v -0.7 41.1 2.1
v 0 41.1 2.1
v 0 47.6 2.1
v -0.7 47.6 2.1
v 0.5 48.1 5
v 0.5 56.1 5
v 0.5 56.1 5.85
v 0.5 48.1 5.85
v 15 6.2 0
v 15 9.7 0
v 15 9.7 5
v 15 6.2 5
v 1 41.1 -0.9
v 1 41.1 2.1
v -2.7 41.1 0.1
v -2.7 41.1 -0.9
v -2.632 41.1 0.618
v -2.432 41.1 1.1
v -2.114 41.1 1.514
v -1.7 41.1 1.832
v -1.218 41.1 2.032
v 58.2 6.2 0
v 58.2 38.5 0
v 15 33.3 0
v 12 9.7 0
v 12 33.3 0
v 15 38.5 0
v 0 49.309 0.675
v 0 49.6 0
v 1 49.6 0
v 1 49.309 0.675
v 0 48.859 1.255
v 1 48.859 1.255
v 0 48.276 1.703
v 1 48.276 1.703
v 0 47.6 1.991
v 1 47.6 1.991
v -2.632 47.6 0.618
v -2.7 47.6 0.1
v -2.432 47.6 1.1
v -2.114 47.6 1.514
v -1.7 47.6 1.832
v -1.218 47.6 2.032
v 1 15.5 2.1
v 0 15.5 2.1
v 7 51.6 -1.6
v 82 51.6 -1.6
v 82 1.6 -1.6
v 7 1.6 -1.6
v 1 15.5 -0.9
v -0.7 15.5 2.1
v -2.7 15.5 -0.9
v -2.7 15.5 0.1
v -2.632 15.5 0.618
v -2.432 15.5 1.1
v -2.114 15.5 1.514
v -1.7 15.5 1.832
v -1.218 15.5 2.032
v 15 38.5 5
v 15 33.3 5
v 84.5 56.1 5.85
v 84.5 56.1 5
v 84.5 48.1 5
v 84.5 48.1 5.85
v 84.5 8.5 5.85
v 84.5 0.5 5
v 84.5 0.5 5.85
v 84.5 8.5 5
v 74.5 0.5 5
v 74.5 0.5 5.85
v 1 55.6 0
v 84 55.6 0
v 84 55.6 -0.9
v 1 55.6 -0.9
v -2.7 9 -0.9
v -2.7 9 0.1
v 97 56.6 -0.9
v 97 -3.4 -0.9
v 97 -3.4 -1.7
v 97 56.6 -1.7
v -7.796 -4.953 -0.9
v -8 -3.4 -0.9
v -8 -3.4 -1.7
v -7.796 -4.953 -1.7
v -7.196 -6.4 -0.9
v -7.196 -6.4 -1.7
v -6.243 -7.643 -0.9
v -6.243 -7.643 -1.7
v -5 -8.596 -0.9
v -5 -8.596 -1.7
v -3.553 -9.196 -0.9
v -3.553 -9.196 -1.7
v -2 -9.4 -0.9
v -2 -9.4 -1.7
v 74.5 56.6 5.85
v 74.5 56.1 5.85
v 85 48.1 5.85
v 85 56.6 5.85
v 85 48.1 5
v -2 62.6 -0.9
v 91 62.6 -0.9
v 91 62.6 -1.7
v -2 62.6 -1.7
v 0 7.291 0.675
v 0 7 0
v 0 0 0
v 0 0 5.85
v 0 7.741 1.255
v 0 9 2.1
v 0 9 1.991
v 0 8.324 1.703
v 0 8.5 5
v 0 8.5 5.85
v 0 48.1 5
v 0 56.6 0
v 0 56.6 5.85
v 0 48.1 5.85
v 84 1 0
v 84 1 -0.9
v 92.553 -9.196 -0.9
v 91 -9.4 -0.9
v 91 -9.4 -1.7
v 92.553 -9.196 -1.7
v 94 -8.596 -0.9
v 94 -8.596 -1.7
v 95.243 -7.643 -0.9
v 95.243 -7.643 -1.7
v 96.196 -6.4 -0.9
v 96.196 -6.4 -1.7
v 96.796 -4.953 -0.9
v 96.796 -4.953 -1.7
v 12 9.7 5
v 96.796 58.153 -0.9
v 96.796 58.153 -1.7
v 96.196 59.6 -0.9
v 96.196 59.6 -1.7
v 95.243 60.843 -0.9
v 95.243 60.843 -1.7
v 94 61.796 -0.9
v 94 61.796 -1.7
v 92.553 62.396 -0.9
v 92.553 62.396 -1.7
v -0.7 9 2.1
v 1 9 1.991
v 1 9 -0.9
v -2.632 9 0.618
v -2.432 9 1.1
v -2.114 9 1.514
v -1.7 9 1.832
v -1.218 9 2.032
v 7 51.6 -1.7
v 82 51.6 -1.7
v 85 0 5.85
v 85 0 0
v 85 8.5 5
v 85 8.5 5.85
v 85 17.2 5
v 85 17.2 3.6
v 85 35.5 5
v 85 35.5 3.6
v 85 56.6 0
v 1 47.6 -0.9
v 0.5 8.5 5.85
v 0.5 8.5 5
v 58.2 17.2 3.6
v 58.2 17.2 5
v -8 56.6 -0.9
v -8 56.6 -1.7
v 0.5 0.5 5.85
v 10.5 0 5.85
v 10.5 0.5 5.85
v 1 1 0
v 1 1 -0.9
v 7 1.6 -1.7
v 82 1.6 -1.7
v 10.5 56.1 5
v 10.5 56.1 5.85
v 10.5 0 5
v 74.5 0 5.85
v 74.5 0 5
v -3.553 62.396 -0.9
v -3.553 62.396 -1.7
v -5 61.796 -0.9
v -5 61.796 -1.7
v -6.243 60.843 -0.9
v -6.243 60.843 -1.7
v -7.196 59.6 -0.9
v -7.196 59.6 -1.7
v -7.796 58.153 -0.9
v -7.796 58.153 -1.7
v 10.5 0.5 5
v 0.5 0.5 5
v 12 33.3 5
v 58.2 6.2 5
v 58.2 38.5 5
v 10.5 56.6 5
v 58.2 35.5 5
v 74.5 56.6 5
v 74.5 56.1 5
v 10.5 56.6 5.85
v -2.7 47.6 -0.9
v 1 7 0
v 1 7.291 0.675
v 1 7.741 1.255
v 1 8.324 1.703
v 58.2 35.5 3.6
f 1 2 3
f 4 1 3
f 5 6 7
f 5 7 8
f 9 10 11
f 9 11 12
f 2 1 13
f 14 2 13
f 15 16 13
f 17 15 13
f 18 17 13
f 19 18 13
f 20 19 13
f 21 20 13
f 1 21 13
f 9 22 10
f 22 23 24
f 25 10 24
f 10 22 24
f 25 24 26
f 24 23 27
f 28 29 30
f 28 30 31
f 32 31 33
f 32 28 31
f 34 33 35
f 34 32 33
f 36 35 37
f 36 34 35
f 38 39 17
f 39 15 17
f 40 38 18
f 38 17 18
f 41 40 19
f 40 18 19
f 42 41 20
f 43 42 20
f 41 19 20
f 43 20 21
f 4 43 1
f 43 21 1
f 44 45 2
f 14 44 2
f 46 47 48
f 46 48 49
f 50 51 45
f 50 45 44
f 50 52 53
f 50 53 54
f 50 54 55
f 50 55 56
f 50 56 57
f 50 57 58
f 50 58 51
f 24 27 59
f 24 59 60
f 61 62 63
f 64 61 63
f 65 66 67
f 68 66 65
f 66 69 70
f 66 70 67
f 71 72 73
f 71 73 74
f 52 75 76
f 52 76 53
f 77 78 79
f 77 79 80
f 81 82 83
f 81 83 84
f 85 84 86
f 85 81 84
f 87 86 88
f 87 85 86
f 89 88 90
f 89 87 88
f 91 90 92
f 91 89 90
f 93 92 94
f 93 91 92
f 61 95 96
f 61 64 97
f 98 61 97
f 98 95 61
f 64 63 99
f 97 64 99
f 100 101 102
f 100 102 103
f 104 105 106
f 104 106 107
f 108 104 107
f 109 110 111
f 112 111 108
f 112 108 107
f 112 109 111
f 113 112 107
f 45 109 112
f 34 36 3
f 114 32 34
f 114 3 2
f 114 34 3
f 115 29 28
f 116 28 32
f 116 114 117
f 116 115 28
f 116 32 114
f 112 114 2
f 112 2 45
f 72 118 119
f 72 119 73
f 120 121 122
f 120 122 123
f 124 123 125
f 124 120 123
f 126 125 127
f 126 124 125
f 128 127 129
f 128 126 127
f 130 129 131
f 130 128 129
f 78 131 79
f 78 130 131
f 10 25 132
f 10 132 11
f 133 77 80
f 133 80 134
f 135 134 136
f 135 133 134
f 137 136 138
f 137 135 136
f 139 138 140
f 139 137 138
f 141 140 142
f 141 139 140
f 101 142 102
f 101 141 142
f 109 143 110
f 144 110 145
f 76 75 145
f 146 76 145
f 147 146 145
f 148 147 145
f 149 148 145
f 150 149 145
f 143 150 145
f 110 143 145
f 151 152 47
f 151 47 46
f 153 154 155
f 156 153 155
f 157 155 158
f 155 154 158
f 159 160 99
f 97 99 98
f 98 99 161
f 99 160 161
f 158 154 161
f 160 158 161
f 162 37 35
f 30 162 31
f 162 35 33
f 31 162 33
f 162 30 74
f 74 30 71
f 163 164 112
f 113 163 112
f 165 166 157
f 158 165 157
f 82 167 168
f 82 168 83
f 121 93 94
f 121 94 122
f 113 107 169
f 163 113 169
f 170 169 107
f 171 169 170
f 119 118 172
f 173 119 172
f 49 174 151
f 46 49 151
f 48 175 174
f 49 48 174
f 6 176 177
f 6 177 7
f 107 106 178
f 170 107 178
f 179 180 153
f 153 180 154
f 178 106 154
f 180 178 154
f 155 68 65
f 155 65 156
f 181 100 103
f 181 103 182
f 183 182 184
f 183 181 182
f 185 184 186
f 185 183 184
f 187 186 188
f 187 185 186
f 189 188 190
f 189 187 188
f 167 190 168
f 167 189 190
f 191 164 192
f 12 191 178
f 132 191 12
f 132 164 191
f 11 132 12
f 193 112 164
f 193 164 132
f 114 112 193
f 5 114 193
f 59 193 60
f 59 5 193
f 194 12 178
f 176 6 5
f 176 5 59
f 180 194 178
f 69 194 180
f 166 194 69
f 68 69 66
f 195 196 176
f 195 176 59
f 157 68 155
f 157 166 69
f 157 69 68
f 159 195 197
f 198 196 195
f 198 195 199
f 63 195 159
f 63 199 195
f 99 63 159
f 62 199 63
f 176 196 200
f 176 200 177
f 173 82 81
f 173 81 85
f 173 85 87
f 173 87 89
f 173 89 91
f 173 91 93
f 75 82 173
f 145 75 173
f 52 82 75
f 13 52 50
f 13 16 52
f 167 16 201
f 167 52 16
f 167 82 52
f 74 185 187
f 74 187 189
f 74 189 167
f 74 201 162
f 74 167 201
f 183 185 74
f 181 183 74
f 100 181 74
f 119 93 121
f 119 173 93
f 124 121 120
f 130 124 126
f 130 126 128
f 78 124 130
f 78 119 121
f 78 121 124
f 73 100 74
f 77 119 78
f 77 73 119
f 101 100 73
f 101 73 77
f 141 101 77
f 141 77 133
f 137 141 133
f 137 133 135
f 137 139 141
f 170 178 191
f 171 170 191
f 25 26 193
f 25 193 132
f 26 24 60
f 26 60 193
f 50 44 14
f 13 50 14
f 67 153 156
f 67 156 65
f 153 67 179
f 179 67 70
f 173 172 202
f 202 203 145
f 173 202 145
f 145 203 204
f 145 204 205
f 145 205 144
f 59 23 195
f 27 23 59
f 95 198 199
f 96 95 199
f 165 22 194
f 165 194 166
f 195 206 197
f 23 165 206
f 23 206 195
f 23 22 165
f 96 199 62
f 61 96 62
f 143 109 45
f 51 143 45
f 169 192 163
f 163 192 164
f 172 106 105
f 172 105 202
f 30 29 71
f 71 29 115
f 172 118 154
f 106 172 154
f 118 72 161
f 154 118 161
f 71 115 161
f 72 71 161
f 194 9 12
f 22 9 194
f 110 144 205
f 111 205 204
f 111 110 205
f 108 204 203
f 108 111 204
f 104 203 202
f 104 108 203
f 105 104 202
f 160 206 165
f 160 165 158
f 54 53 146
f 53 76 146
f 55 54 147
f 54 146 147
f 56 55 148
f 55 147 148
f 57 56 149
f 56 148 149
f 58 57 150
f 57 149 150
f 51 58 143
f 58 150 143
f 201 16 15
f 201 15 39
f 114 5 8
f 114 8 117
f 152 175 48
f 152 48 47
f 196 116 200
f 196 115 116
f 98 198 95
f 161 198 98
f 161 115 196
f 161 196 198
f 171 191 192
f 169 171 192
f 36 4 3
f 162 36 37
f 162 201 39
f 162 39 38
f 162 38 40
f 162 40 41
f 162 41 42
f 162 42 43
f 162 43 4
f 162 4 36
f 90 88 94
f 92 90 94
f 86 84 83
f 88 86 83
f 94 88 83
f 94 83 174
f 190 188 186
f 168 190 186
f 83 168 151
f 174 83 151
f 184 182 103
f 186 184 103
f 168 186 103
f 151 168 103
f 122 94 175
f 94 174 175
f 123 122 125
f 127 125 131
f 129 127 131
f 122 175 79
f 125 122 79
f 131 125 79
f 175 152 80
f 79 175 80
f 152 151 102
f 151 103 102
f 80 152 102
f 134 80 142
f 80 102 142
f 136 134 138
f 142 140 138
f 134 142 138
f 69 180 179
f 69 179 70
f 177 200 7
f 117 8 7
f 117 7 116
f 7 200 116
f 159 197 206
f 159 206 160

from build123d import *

# Parameters (mm, degrees)
CROQUIS1_W              = 85
CROQUIS1_H              = 56.6
SALIENTE_EXTRUIR1_DEPTH = 5
SALIENTE_EXTRUIR2_DEPTH = 0.85
CROQUIS3_W              = 83
CROQUIS3_H              = 54.6
SALIENTE_EXTRUIR3_DEPTH = 0.9
SALIENTE_EXTRUIR4_DEPTH = 0.8
CROQUIS5_W              = 75
CROQUIS5_H              = 50
CORTAR_EXTRUIR1_DEPTH   = 0.1
CROQUIS6_W              = 26.8
CROQUIS6_H              = 18.3
CORTAR_EXTRUIR2_DEPTH   = 1.4
CROQUIS7_W              = 2.1
CROQUIS7_H              = 42.6
CORTAR_EXTRUIR3_DEPTH   = 1
REDONDEO1_R             = 2.9
SALIENTE_EXTRUIR5_REACH = 117.643
CROQUIS8_W              = 3.7
CROQUIS8_H              = 6.5
REDONDEO2_R             = 2


with BuildPart() as part:
    # Croquis1 → Saliente-Extruir1 (new body)
    with BuildSketch(Plane.XY):
        with Locations((42.5, 28.3)):
            Rectangle(CROQUIS1_W, CROQUIS1_H)
        Polygon((12, 33.3), (12, 9.7), (15, 9.7), (15, 6.2), (58.2, 6.2), (58.2, 38.5), (15, 38.5), (15, 33.3), align=None, mode=Mode.SUBTRACT)
    extrude(amount=SALIENTE_EXTRUIR1_DEPTH)

    # Croquis2 → Saliente-Extruir2 (add)
    with BuildSketch(Plane.XY.offset(5)):
        Polygon((0, 56.6), (10.5, 56.6), (10.5, 56.1), (0.5, 56.1), (0.5, 48.1), (0, 48.1), align=None)
        Polygon((85, 48.1), (85, 56.6), (74.5, 56.6), (74.5, 56.1), (84.5, 56.1), (84.5, 48.1), align=None)
        Polygon((85, 0), (74.5, 0), (74.5, 0.5), (84.5, 0.5), (84.5, 8.5), (85, 8.5), align=None)
        Polygon((0, 8.5), (0, 0), (10.5, 0), (10.5, 0.5), (0.5, 0.5), (0.5, 8.5), align=None)
    extrude(amount=SALIENTE_EXTRUIR2_DEPTH)

    # Croquis3 → Saliente-Extruir3 (add)
    with BuildSketch(Plane(origin=(0, 0, 0), x_dir=(-1, 0, 0), z_dir=(0, 0, -1))):
        with Locations((-42.5, 28.3)):
            Rectangle(CROQUIS3_W, CROQUIS3_H)
    extrude(amount=SALIENTE_EXTRUIR3_DEPTH)

    # Croquis4 → Saliente-Extruir4 (add)
    with BuildSketch(Plane(origin=(0, 0, -0.9), x_dir=(-1, 0, 0), z_dir=(0, 0, -1))):
        with BuildLine():
            Line((-91, 62.6), (2, 62.6))
            ThreePointArc((2, 62.6), (6.242640687, 60.842640687), (8, 56.6))
            Line((8, 56.6), (8, -3.4))
            ThreePointArc((8, -3.4), (6.242640687, -7.642640687), (2, -9.4))
            Line((2, -9.4), (-91, -9.4))
            ThreePointArc((-91, -9.4), (-95.242640687, -7.642640687), (-97, -3.4))
            Line((-97, -3.4), (-97, 56.6))
            ThreePointArc((-97, 56.6), (-95.242640687, 60.842640687), (-91, 62.6))
        make_face()
    extrude(amount=SALIENTE_EXTRUIR4_DEPTH)

    # Croquis5 → Cortar-Extruir1 (cut)
    with BuildSketch(Plane(origin=(0, 0, -1.7), x_dir=(-1, 0, 0), z_dir=(0, 0, -1))):
        with Locations((-44.5, 26.6)):
            Rectangle(CROQUIS5_W, CROQUIS5_H)
    extrude(amount=-CORTAR_EXTRUIR1_DEPTH, mode=Mode.SUBTRACT)

    # Croquis6 → Cortar-Extruir2 (cut)
    with BuildSketch(Plane.XY.offset(5)):
        with Locations((71.6, 26.35)):
            Rectangle(CROQUIS6_W, CROQUIS6_H)
    extrude(amount=-CORTAR_EXTRUIR2_DEPTH, mode=Mode.SUBTRACT)

    # Croquis7 → Cortar-Extruir3 (cut)
    with BuildSketch(Plane.ZY):
        with Locations((1.05, 28.3)):
            Rectangle(CROQUIS7_W, CROQUIS7_H)
    extrude(amount=-CORTAR_EXTRUIR3_DEPTH, mode=Mode.SUBTRACT)

    # Redondeo1
    # the kernel refuses this fillet: 2.9 mm, written as the material it adds along each edge
    with BuildSketch(Plane(origin=(0, 7, 2.1), x_dir=(0, 0, -1), z_dir=(1, 0, 0))) as redondeo1_piece_1:
        with BuildLine():
            CenterArc((2.9, 2.787471973), REDONDEO1_R, 180, 73.986605576)
            Line((0, 2.787471973), (-0.058, 2.787471973))
            Line((-0.058, 2.787471973), (-0.058, 0))
            Line((-0.058, 0), (0, -0.058))
            ThreePointArc((0, -0.058), (1.05, -0.058), (2.084, -0.055749439))
            Line((2.084, -0.055749439), (2.1, 0))
        make_face()
    extrude(amount=7.968679932)
    with BuildSketch(Plane(origin=(0, 49.6, 2.1), x_dir=(0, 0, -1), z_dir=(1, 0, 0))) as redondeo1_piece_2:
        with BuildLine():
            CenterArc((2.9, -2.787471973), REDONDEO1_R, 106.013394424, 73.986605576)
            Line((0, -2.787471973), (-0.058, -2.787471973))
            Line((-0.058, -2.787471973), (-0.058, 0))
            Line((-0.058, 0), (0, 0.058))
            ThreePointArc((0, 0.058), (1.05, 0.058), (2.084, 0.055749439))
            Line((2.084, 0.055749439), (2.1, 0))
        make_face()
    extrude(amount=7.968679932)

    # Saliente-Extruir5: up to this face of the body (flat: up to its plane)
    saliente_extruir5_end = Plane(part.part.faces().sort_by_distance((0.5, 28.3, 2.1))[0])
    # Croquis8 → Saliente-Extruir5 (add, up to the picked face)
    with BuildSketch(Plane.XY.offset(-0.9), mode=Mode.PRIVATE) as saliente_extruir5_sk1:
        with Locations((-0.85, 44.35)):
            Rectangle(CROQUIS8_W, CROQUIS8_H)
    saliente_extruir5_tool1 = split(extrude(saliente_extruir5_sk1.sketch, amount=SALIENTE_EXTRUIR5_REACH, mode=Mode.PRIVATE), bisect_by=saliente_extruir5_end, keep=Keep.BOTH, mode=Mode.PRIVATE)
    # Croquis8 → Saliente-Extruir5 (add, up to the picked face)
    with BuildSketch(Plane.XY.offset(-0.9), mode=Mode.PRIVATE) as saliente_extruir5_sk2:
        with Locations((-0.85, 12.25)):
            Rectangle(CROQUIS8_W, CROQUIS8_H)
    saliente_extruir5_tool2 = split(extrude(saliente_extruir5_sk2.sketch, amount=SALIENTE_EXTRUIR5_REACH, mode=Mode.PRIVATE), bisect_by=saliente_extruir5_end, keep=Keep.BOTH, mode=Mode.PRIVATE)
    add(saliente_extruir5_tool1.solids().sort_by(Axis((-0.85, 44.35, -0.9), (0, 0, 1)))[0])
    add(saliente_extruir5_tool2.solids().sort_by(Axis((-0.85, 12.25, -0.9), (0, 0, 1)))[0])

    # Redondeo2
    redondeo2_edges = [part.edges().sort_by_distance(p)[0] for p in [
        (-2.7, 44.35, 2.1),
        (-2.7, 12.25, 2.1),
    ]]
    fillet(redondeo2_edges, radius=REDONDEO2_R)


solid = part.part
